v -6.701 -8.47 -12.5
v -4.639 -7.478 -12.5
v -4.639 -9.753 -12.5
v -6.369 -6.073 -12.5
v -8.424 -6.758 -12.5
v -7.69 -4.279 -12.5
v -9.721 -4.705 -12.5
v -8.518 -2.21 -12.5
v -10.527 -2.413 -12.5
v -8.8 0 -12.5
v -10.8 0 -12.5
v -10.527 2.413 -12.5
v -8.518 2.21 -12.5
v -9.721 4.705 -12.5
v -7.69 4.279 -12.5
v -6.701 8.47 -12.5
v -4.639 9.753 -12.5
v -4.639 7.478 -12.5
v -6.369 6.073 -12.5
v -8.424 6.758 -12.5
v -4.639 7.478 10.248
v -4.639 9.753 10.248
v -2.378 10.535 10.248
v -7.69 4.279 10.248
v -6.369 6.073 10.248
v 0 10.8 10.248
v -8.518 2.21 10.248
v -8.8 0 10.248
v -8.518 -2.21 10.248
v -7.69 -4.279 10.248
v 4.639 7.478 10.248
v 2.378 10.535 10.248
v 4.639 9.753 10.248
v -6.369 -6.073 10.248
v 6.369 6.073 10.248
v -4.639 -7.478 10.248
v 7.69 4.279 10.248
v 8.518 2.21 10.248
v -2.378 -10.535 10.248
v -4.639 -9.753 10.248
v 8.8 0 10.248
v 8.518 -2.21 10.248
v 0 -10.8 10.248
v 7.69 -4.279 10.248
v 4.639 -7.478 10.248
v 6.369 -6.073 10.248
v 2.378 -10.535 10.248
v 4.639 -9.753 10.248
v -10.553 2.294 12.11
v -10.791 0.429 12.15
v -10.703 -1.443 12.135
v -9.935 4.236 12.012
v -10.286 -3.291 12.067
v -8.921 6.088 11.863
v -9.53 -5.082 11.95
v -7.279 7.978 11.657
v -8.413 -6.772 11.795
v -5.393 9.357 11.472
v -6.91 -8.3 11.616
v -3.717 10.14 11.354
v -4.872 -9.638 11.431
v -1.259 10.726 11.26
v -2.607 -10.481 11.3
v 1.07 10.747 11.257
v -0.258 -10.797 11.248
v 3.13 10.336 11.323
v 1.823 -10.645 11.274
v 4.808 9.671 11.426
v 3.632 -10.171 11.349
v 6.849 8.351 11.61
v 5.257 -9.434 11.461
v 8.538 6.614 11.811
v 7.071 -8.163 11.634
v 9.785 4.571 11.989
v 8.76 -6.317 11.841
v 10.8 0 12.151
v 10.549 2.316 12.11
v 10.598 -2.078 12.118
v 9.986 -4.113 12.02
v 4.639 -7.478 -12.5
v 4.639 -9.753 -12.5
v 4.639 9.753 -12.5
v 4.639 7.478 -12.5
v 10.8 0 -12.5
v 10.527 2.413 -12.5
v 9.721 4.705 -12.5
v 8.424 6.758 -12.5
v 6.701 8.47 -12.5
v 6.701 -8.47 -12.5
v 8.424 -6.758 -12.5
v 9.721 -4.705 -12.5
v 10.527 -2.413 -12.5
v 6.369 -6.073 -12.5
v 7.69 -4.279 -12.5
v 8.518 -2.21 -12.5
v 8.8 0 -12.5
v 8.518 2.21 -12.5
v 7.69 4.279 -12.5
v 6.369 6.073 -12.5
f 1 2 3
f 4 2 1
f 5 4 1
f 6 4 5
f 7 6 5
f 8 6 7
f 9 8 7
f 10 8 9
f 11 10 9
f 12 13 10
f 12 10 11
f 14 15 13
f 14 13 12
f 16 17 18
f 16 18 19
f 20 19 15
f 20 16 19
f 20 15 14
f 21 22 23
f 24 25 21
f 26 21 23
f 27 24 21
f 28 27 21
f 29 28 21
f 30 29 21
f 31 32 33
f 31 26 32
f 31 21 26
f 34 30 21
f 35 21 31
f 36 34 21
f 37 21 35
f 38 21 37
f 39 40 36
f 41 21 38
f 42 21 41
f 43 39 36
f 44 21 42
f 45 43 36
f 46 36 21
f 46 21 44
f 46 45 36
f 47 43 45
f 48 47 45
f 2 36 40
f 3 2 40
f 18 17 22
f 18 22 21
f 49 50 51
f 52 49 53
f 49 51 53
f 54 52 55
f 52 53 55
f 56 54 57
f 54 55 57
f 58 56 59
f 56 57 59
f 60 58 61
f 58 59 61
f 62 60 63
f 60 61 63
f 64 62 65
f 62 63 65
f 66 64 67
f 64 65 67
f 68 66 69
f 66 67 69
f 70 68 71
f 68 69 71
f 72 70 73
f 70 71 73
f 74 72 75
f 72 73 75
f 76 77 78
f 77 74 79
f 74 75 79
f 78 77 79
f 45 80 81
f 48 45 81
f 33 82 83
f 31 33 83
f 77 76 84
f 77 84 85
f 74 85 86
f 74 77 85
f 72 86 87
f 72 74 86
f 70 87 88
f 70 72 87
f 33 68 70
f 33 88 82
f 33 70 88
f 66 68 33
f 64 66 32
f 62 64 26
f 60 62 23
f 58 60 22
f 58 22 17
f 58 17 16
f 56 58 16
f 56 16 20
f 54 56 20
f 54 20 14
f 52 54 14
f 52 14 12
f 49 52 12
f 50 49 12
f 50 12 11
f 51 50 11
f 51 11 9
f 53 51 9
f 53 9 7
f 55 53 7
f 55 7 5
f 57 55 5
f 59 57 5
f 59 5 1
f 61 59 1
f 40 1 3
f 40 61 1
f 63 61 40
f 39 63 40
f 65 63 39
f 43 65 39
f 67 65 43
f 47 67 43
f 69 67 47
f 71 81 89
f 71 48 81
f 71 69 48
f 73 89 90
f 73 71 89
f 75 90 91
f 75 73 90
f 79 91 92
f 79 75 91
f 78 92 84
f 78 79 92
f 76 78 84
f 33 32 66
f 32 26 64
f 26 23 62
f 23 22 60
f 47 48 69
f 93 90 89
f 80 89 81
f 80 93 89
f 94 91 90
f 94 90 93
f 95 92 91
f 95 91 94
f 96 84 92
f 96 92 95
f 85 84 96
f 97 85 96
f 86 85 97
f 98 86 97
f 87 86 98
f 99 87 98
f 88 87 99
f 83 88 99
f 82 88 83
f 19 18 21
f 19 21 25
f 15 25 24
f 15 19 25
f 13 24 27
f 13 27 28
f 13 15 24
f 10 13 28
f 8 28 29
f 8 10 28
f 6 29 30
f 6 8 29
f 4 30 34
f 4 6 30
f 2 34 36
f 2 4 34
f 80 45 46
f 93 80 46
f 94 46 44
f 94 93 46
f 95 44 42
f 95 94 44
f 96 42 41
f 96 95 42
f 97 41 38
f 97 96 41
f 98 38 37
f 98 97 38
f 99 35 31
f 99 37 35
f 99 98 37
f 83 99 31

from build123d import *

# Parameters (mm, degrees)
F2_W     = 9.278574
F2_H     = 23.490808
F3_DEPTH = 22.747948
F4_R     = 65
F5_DEPTH = 12.5


with BuildPart() as f1:
    # F0 (on Front) → F1 (revolve)
    with BuildSketch(Plane.XZ):
        Polygon((10.8, -12.5), (10.8, 15.247948), (0, 15.247948), (0, 10.247948), (8.8, 10.247948), (8.8, -11.752052), (8.8, -12.5), align=None)
    revolve(axis=Axis((0, 0, 12.181249), (0, 0, 1)))

    # F2 (on face) → F3 (cut, through all)
    with BuildSketch(Plane(origin=(0, 0, -12.5), x_dir=(1, 0, 0), z_dir=(0, 0, -1))):
        Rectangle(F2_W, F2_H)
    extrude(amount=-F3_DEPTH, mode=Mode.SUBTRACT)

    # F4 (on Front) → F5 (cut, symmetric)
    with BuildSketch(Plane.XZ):
        with Locations((0, 76.247948)):
            Circle(F4_R)
    extrude(amount=F5_DEPTH, both=True, mode=Mode.SUBTRACT)


solid = f1.part
